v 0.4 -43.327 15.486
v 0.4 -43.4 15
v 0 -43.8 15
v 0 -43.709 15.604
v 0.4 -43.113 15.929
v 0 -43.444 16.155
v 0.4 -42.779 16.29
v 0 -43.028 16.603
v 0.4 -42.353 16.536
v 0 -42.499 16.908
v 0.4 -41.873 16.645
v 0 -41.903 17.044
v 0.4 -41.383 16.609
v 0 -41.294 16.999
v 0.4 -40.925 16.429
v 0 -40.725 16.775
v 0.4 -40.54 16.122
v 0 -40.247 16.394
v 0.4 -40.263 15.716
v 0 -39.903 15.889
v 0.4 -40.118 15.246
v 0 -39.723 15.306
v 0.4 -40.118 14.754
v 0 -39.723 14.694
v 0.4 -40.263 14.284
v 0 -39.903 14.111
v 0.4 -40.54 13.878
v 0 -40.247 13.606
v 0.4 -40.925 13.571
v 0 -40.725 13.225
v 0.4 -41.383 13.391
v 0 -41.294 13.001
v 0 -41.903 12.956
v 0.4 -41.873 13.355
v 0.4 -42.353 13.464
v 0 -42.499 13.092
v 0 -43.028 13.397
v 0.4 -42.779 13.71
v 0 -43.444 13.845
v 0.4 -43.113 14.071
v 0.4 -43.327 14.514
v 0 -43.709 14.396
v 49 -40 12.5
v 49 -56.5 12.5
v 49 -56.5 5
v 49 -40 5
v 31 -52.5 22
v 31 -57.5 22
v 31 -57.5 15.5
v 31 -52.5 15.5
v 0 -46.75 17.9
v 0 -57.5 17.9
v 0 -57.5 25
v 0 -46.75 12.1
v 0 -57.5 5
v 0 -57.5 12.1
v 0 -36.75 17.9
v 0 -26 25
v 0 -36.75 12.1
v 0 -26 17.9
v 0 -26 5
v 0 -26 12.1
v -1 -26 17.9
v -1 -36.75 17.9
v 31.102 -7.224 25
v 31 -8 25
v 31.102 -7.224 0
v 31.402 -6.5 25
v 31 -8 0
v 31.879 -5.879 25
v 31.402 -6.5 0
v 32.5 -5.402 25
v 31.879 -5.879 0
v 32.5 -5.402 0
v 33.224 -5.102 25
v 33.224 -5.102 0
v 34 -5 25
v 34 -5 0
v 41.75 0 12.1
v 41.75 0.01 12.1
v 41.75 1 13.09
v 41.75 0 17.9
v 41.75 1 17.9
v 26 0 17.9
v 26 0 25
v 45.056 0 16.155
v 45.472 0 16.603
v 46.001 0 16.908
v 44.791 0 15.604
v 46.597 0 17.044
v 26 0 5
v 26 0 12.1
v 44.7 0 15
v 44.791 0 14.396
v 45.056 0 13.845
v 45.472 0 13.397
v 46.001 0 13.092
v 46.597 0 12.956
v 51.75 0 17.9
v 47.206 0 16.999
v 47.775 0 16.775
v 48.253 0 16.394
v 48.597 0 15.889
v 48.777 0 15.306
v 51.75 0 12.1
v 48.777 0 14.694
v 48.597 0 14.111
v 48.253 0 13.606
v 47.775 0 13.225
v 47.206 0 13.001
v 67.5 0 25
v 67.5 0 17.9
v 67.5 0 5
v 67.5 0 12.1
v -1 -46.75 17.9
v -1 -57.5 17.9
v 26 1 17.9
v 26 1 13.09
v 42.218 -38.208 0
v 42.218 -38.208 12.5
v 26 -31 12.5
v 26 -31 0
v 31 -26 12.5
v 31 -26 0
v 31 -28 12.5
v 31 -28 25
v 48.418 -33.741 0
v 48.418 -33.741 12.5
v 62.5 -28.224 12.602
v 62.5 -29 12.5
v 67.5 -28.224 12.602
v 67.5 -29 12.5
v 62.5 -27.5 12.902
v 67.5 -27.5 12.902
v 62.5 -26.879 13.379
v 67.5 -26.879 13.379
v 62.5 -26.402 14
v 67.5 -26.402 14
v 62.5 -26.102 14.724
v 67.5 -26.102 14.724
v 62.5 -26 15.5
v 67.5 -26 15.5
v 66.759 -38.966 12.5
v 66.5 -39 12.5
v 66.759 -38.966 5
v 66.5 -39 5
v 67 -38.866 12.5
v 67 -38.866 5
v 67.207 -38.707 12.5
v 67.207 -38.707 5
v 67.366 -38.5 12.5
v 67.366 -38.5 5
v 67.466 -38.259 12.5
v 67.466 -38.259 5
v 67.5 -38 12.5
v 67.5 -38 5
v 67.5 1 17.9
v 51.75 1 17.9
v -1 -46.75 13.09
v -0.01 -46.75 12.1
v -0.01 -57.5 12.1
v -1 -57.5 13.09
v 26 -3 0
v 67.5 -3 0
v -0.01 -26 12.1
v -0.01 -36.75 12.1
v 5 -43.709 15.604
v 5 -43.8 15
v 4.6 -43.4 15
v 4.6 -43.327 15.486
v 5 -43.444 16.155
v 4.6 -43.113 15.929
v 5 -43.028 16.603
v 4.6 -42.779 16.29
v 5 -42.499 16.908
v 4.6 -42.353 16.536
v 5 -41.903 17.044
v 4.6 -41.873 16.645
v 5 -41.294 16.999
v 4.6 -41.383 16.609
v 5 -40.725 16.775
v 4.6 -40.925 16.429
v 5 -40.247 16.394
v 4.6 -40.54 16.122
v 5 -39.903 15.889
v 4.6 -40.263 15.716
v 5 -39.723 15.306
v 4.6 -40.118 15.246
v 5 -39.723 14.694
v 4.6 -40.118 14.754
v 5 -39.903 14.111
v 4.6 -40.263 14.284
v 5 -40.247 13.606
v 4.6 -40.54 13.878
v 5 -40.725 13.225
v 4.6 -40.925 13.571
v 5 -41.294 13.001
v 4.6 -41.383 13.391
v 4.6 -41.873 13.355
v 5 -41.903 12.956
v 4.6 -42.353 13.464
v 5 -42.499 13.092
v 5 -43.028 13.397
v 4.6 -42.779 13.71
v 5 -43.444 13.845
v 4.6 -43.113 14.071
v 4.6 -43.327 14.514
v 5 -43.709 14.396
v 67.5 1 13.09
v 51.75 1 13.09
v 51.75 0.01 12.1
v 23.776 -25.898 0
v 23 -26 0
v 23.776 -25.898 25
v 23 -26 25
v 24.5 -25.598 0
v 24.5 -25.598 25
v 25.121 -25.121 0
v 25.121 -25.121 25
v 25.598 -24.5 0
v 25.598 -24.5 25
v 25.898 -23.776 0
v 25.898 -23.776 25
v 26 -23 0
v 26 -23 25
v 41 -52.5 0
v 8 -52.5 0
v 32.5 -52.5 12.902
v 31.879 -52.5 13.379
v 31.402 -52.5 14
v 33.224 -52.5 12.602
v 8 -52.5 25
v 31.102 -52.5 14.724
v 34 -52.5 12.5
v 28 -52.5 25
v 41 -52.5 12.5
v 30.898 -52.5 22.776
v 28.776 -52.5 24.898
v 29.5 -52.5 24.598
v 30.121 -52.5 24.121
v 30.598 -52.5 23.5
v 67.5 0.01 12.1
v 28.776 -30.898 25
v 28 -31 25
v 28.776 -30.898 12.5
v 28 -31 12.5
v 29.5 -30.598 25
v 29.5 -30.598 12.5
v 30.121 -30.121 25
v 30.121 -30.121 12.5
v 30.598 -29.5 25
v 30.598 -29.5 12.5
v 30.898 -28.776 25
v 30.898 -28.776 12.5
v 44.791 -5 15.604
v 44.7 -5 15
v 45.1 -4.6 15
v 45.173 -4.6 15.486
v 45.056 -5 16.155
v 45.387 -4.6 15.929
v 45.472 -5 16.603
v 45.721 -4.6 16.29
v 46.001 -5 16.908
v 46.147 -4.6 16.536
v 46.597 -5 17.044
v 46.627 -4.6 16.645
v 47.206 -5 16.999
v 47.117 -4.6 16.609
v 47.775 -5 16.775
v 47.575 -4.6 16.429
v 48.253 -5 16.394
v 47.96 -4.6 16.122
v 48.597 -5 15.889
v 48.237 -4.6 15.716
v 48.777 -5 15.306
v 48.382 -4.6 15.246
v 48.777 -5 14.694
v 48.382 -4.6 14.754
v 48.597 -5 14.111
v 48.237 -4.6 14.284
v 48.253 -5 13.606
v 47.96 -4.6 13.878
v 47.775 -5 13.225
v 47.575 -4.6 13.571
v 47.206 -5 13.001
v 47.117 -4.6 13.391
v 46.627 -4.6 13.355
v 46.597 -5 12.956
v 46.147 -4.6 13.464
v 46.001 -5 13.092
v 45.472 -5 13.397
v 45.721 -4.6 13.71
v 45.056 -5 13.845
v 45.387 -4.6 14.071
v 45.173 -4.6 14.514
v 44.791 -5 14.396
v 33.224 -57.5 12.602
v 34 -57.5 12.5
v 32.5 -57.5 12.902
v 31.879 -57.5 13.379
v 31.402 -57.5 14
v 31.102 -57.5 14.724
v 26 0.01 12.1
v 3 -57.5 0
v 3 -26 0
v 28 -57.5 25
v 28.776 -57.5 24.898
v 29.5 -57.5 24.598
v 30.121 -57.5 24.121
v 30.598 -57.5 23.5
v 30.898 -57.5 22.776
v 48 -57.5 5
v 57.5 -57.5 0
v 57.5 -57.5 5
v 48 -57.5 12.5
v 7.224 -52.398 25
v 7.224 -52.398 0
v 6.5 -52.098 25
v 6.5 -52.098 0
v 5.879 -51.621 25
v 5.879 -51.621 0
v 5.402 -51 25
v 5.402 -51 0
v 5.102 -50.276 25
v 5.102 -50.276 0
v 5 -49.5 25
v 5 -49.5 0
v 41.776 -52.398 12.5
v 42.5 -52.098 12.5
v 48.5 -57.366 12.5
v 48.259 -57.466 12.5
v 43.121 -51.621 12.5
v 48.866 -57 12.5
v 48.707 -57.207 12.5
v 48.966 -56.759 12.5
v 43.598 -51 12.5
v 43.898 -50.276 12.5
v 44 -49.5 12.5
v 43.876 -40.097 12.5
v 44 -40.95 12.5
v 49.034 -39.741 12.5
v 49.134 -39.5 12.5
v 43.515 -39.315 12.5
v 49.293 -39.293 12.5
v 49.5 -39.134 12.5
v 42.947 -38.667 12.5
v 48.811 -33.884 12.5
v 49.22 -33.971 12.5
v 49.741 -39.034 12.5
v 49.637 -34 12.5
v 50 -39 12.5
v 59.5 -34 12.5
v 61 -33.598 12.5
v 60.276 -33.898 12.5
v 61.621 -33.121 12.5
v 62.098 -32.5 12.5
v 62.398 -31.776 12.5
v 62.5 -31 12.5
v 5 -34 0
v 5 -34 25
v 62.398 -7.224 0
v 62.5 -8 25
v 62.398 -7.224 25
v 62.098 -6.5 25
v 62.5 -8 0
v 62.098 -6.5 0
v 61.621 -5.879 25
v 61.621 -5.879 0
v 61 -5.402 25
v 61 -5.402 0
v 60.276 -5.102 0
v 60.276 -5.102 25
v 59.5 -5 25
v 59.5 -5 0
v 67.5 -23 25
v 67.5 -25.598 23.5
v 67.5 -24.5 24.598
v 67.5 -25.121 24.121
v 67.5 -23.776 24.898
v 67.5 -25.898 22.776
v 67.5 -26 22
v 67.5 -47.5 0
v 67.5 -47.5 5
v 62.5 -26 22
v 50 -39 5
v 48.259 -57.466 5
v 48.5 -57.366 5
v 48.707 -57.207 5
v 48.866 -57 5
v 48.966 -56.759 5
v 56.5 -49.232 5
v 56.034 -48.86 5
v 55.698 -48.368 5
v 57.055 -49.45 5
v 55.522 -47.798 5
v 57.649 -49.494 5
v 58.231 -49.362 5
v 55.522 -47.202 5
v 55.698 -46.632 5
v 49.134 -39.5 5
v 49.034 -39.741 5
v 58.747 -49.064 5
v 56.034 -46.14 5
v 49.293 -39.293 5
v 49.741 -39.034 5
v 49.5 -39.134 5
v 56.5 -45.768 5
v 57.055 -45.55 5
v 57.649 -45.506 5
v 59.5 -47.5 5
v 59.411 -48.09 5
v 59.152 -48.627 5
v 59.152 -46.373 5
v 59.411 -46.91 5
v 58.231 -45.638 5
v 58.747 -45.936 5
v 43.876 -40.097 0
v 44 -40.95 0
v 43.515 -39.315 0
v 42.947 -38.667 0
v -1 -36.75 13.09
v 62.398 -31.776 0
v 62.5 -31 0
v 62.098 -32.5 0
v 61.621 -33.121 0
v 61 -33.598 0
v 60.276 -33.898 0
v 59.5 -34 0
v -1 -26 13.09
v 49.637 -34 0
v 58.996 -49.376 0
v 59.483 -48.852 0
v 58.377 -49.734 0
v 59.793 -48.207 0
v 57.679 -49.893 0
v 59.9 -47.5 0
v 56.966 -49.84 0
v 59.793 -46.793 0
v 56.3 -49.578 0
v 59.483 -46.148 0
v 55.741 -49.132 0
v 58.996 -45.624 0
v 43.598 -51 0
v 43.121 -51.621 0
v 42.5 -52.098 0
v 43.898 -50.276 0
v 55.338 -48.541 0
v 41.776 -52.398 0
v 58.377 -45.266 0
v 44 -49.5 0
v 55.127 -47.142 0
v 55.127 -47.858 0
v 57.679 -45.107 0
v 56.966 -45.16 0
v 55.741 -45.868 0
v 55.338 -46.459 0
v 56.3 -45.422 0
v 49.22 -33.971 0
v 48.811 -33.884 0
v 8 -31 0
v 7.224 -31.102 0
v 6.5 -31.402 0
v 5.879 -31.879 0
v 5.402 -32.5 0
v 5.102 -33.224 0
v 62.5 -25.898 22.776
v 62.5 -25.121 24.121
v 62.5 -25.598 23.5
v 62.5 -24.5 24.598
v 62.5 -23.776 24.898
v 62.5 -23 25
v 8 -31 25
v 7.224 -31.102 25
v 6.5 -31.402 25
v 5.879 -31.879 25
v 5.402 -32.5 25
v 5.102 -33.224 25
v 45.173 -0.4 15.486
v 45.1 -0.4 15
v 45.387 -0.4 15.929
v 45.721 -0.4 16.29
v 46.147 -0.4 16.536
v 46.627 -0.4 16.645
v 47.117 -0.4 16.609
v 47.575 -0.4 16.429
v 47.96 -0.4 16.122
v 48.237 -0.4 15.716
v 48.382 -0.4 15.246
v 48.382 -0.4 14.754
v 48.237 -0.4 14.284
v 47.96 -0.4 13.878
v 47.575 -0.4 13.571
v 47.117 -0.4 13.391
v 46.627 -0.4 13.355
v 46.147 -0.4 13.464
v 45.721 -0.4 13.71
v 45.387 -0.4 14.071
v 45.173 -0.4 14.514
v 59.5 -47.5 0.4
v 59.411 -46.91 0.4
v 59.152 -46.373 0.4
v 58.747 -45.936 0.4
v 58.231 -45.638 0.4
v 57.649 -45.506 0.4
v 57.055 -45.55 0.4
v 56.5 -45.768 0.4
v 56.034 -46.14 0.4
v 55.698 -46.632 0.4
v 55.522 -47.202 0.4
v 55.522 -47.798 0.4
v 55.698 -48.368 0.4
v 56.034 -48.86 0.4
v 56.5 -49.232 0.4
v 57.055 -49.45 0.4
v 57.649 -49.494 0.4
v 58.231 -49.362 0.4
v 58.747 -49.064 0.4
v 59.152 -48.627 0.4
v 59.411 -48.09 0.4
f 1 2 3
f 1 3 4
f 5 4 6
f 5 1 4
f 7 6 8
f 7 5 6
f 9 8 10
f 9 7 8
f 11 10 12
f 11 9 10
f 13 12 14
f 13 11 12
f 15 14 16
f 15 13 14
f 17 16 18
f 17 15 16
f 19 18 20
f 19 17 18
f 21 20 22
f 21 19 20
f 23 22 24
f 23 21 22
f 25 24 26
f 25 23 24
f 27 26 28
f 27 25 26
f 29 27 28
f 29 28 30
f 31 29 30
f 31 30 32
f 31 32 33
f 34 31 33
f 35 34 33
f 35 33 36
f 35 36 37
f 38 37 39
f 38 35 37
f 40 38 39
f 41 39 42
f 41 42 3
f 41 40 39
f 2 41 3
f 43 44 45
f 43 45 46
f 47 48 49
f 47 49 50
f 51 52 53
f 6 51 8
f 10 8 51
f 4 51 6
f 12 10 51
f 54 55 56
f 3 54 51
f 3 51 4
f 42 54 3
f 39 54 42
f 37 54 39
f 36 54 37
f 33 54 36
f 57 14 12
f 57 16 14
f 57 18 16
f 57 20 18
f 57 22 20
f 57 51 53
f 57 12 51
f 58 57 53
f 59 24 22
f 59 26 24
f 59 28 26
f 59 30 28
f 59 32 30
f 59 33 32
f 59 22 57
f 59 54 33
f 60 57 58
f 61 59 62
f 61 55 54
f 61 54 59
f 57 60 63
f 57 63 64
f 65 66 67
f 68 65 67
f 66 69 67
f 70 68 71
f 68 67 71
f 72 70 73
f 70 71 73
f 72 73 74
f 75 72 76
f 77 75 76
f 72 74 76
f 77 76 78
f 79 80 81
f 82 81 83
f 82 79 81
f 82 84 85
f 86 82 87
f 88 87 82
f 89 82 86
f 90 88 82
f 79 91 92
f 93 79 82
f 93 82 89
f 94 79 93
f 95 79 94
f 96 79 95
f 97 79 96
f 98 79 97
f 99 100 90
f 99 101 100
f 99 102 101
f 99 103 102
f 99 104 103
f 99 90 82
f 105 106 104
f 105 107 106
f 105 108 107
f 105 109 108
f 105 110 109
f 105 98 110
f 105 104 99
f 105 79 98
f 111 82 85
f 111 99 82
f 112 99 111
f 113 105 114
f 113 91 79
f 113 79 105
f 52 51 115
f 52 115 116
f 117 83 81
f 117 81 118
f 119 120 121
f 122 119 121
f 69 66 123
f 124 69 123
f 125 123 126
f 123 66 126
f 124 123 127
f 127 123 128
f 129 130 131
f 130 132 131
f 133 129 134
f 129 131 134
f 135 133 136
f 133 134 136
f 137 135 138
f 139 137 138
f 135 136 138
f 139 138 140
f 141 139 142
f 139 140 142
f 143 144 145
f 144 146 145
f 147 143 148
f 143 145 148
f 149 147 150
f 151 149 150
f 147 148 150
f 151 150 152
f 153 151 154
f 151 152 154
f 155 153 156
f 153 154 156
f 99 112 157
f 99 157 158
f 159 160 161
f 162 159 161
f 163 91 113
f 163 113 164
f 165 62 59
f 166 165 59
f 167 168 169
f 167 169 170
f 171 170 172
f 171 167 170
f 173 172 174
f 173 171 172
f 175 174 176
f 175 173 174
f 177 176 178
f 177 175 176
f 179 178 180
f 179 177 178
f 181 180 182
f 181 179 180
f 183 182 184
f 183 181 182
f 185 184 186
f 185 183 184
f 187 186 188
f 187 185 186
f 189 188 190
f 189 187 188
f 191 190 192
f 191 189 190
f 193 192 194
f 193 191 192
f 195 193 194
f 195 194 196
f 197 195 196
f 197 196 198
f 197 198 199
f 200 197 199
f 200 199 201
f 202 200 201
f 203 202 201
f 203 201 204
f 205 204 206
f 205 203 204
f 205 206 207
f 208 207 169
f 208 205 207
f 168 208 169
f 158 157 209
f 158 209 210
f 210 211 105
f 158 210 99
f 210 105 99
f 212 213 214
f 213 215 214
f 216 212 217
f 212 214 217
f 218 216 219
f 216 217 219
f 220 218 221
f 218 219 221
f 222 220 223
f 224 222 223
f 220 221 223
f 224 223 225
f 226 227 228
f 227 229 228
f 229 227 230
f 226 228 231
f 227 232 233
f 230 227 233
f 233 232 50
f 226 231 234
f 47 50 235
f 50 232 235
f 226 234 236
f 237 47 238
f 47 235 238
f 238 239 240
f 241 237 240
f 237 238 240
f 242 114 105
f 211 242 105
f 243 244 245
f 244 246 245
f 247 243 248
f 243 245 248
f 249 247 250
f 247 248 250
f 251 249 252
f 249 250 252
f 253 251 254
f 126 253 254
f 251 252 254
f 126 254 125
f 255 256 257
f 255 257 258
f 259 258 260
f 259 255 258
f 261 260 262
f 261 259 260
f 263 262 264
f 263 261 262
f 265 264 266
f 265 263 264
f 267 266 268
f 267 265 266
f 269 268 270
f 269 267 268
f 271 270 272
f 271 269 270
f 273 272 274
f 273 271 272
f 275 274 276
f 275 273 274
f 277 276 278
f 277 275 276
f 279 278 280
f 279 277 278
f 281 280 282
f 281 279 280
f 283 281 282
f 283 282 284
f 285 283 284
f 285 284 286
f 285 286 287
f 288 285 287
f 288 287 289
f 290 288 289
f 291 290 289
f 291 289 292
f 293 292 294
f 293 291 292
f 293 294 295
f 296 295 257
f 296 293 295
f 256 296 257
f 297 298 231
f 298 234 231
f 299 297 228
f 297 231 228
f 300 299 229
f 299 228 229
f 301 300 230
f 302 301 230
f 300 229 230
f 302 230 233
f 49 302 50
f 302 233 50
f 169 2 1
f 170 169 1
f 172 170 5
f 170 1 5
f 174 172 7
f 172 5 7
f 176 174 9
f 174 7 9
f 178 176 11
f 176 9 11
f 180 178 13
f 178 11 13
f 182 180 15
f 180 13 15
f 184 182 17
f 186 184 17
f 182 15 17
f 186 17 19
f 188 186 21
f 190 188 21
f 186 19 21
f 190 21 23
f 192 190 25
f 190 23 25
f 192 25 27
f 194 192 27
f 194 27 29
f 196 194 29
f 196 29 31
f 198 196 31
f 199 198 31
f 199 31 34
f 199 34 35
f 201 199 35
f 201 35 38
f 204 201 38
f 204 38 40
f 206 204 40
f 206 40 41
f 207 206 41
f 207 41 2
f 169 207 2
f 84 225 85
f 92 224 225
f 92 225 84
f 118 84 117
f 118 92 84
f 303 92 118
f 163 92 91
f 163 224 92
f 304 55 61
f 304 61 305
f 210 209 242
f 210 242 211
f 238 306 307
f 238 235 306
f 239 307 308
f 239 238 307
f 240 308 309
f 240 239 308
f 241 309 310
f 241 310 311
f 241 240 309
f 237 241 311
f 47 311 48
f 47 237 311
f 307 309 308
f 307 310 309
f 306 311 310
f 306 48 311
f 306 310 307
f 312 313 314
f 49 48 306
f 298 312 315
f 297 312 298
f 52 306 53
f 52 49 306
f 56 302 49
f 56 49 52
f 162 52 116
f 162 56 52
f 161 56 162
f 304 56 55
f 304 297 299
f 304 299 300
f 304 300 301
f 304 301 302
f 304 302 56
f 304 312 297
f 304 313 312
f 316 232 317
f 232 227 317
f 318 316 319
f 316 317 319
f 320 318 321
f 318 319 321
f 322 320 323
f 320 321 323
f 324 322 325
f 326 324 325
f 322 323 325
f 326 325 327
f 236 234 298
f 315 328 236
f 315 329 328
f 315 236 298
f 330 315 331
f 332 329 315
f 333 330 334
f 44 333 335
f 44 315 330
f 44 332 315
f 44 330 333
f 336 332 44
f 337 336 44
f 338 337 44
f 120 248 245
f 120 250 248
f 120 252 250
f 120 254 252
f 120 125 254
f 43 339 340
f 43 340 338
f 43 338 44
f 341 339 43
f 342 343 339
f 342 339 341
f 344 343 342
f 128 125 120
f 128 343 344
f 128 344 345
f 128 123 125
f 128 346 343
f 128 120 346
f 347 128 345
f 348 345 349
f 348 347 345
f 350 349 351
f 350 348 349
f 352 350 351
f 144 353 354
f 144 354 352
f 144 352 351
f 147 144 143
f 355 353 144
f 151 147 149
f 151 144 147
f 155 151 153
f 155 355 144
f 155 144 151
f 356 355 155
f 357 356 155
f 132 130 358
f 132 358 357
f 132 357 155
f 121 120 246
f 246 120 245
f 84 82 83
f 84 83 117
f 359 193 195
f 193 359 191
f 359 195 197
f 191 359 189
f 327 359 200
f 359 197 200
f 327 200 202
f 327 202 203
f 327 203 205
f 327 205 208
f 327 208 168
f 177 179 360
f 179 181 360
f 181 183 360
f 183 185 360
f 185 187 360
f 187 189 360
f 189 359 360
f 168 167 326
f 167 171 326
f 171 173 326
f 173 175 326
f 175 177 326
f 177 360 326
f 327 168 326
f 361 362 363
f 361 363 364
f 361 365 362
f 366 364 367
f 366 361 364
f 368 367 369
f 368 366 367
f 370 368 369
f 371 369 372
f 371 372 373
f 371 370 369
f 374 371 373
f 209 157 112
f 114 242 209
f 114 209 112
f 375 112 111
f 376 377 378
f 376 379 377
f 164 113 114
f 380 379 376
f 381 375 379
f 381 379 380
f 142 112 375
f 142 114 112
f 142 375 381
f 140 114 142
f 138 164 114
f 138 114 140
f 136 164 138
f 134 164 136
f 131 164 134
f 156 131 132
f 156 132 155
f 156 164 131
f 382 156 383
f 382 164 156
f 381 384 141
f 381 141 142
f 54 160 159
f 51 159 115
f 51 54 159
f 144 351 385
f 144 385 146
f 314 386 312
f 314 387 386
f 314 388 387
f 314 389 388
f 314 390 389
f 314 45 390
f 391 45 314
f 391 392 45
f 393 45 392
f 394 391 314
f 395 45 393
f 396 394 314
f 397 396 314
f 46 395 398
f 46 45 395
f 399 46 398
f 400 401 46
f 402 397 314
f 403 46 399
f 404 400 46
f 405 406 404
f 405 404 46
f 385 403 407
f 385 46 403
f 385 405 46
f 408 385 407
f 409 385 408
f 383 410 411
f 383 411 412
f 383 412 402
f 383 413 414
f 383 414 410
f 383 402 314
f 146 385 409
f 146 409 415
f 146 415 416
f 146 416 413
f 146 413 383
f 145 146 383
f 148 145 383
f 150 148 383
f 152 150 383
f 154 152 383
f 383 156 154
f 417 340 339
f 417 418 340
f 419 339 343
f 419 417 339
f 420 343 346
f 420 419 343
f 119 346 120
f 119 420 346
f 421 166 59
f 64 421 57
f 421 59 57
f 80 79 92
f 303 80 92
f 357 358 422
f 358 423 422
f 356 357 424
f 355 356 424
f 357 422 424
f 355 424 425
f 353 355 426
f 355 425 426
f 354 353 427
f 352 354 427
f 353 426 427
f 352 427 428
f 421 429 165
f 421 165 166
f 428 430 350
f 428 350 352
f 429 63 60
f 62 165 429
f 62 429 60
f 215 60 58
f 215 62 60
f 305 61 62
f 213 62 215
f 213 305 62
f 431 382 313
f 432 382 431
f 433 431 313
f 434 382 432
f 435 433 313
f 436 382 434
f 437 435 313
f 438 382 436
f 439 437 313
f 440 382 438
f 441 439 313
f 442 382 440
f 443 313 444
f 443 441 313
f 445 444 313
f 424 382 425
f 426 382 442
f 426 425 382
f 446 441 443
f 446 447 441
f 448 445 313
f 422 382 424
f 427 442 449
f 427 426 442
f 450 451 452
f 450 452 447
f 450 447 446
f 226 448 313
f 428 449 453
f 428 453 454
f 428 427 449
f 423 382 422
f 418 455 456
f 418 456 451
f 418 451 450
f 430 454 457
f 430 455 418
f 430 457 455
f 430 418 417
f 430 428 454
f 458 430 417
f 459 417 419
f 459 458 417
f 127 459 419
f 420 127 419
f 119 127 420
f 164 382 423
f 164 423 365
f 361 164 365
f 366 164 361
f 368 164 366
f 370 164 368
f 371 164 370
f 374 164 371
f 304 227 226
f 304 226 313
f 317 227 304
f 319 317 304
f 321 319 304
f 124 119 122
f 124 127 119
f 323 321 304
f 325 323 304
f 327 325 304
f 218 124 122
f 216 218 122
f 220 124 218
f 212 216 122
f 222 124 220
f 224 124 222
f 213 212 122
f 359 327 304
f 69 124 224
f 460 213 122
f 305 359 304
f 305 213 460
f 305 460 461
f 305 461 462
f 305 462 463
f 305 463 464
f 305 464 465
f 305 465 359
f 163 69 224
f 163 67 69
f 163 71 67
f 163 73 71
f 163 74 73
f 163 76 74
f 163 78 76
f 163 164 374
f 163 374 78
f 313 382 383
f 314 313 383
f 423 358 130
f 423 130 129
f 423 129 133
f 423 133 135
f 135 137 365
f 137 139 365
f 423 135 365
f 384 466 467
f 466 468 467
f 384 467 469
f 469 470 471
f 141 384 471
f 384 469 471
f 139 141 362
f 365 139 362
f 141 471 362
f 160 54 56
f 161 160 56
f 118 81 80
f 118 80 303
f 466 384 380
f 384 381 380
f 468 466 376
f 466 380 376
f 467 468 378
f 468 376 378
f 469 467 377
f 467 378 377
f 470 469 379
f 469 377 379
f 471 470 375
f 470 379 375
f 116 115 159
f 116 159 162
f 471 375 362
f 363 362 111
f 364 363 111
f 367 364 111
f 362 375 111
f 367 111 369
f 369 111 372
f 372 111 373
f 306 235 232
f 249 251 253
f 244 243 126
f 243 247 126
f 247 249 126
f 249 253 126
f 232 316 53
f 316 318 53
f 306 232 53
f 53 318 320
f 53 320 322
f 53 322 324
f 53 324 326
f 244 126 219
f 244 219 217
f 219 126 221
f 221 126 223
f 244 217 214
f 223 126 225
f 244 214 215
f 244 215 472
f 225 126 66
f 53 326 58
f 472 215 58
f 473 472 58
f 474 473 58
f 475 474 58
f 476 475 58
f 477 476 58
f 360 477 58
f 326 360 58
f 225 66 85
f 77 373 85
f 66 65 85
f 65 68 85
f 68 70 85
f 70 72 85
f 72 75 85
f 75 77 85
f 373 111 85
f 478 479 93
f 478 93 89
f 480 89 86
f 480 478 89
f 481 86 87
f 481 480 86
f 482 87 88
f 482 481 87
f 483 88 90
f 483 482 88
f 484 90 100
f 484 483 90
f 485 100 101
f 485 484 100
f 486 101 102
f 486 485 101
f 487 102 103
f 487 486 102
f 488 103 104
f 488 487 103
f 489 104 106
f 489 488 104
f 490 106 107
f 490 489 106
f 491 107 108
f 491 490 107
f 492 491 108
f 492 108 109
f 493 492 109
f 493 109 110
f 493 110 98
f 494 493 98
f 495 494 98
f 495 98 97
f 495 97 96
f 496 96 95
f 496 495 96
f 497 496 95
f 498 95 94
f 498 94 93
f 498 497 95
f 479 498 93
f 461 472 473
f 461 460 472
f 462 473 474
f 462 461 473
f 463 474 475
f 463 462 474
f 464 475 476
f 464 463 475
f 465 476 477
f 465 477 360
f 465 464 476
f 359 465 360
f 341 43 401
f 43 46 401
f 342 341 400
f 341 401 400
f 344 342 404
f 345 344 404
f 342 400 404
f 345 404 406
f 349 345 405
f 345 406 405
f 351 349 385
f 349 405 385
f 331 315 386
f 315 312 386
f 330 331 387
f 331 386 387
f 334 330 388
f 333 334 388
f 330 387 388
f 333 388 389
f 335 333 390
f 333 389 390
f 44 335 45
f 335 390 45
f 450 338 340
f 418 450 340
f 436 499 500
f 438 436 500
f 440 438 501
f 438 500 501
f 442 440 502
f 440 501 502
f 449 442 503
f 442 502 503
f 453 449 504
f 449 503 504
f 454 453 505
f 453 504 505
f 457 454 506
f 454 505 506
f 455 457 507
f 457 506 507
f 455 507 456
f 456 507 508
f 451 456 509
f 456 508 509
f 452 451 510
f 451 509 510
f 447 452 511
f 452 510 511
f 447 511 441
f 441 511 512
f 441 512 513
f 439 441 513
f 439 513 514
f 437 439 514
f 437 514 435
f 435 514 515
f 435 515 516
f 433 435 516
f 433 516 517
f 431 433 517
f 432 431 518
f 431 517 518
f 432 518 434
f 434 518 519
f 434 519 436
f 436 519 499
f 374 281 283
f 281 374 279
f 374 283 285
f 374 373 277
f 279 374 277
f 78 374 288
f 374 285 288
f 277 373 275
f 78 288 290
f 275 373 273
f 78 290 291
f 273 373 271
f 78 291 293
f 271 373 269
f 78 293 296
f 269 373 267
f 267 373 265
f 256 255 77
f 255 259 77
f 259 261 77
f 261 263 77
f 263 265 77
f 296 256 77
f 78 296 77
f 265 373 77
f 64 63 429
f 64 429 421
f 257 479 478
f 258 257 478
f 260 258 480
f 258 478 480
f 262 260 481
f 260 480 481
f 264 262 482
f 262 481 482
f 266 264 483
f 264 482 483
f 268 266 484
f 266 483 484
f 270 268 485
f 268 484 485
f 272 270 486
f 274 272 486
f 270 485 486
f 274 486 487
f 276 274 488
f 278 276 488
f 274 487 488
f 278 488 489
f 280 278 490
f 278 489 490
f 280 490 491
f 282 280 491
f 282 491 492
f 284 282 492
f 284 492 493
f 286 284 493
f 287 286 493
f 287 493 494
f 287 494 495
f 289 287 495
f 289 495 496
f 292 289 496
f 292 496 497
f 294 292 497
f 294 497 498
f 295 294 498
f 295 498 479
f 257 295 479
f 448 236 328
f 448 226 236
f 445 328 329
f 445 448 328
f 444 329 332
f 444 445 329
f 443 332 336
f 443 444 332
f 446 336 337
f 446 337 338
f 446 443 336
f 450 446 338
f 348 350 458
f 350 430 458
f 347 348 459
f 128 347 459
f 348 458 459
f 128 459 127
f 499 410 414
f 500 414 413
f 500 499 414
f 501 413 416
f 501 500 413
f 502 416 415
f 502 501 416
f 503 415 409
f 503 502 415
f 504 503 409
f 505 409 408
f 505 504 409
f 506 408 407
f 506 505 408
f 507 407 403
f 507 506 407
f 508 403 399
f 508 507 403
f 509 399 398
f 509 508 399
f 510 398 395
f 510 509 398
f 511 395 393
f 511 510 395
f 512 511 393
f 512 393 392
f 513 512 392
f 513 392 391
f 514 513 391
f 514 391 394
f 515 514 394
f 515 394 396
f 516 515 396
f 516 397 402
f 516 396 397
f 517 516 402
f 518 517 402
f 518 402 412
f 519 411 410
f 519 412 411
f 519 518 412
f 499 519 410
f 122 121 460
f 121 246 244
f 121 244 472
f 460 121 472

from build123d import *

# Parameters (mm, degrees)
SKETCH_R        = 2
PAD_DEPTH       = 25
SKETCH001_W     = 18.5
SKETCH001_H     = 18.5
POCKET_DEPTH    = 20
CHAMFER_SIZE    = 10
POCKET001_DEPTH = 57.501
POCKET002_DEPTH = 67.501
POCKET003_DEPTH = 25.001
SKETCH005_R     = 1.65
POCKET004_DEPTH = 67.501
SKETCH006_R     = 1.65
POCKET005_DEPTH = 57.501
SKETCH007_W     = 36.5
SKETCH007_H     = 31.5
POCKET006_DEPTH = 12.5
SKETCH008_W     = 5
SKETCH008_H     = 2.222222
POCKET007_DEPTH = 12.5
FILLET_R        = 3
FILLET001_R     = 3
FILLET002_R     = 1
CHAMFER001_SIZE = 0.4
SKETCH009_W     = 10.75
SKETCH009_H     = 5.8
PAD001_DEPTH    = 1
SKETCH010_W     = 15.75
SKETCH010_H     = 5.8
PAD002_DEPTH    = 1
CHAMFER002_SIZE = 0.99


with BuildPart() as part:
    # Sketch → Pad (new body)
    with BuildSketch(Plane.XY):
        Polygon((0, -26), (26, -26), (26, 0), (67.5, 0), (67.5, -57.5), (0, -57.5), align=None)
        with Locations((57.5, -47.5)):
            Circle(SKETCH_R, mode=Mode.SUBTRACT)
    extrude(amount=PAD_DEPTH)

    # Sketch001 (on Face9 of Pad) → Pocket (cut)
    with BuildSketch(Plane.XY.offset(25)):
        with Locations((58.25, -48.25)):
            Rectangle(SKETCH001_W, SKETCH001_H)
    extrude(amount=-POCKET_DEPTH, mode=Mode.SUBTRACT)

    # Chamfer
    chamfer_edges = [part.edges().sort_by_distance(p)[0] for p in [
        (67.5, -57.5, 2.5),
    ]]
    chamfer(chamfer_edges, length=CHAMFER_SIZE)

    # Sketch002 (on Face5 of Chamfer) → Pocket001 (cut, through all)
    with BuildSketch(Plane.XZ.offset(57.5)):
        Polygon((0, 5), (3, 0), (0, 0), align=None)
    extrude(amount=-POCKET001_DEPTH, mode=Mode.SUBTRACT)

    # Sketch003 (on Face2 of Pocket001) → Pocket002 (cut, through all)
    with BuildSketch(Plane.YZ.offset(67.5)):
        Polygon((0, 5), (-3, 0), (0, 0), align=None)
    extrude(amount=-POCKET002_DEPTH, mode=Mode.SUBTRACT)

    # Sketch004 (on Face11 of Pocket002) → Pocket003 (cut, through all)
    with BuildSketch(Plane.XY.offset(25)):
        Polygon((5, -31), (5, -52.5), (44, -52.5), (44, -39), (26, -31), align=None)
        Polygon((31, -26), (49, -34), (62.5, -34), (62.5, -5), (31, -5), align=None)
    extrude(amount=-POCKET003_DEPTH, mode=Mode.SUBTRACT)

    # Sketch005 (on Face24 of Pocket003) → Pocket004 (cut, through all)
    with BuildSketch(Plane(origin=(0, 0, 0), x_dir=(0, -1, 0), z_dir=(-1, 0, 0))):
        with Locations((41.75, 15)):
            Circle(SKETCH005_R)
    extrude(amount=-POCKET004_DEPTH, mode=Mode.SUBTRACT)

    # Sketch006 (on Face20 of Pocket004) → Pocket005 (cut, through all)
    with BuildSketch(Plane(origin=(0, 0, 0), x_dir=(-1, 0, 0), z_dir=(0, 1, 0))):
        with Locations((-46.75, 15)):
            Circle(SKETCH006_R)
    extrude(amount=-POCKET005_DEPTH, mode=Mode.SUBTRACT)

    # Sketch007 (on Face23 of Pocket005) → Pocket006 (cut)
    with BuildSketch(Plane.XY.offset(25)):
        with Locations((49.25, -41.75)):
            Rectangle(SKETCH007_W, SKETCH007_H)
    extrude(amount=-POCKET006_DEPTH, mode=Mode.SUBTRACT)

    # Sketch008 (on Face25 of Pocket006) → Pocket007 (cut)
    with BuildSketch(Plane.XY.offset(25)):
        with Locations((28.5, -32.111111)):
            Rectangle(SKETCH008_W, SKETCH008_H)
    extrude(amount=-POCKET007_DEPTH, mode=Mode.SUBTRACT)

    # Fillet
    fillet_edges = [part.edges().sort_by_distance(p)[0] for p in [
        (31, -55, 25),
        (65, -26, 25),
        (31, -55, 12.5),
        (65, -26, 12.5),
    ]]
    fillet(fillet_edges, radius=FILLET_R)

    # Fillet001
    fillet001_edges = [part.edges().sort_by_distance(p)[0] for p in [
        (5, -52.5, 12.5),
        (5, -31, 12.5),
        (31, -5, 12.5),
        (62.5, -5, 12.5),
        (62.5, -34, 6.25),
        (49, -34, 6.25),
        (44, -39, 6.25),
        (44, -52.5, 6.25),
        (31, -31, 18.75),
        (26, -26, 12.5),
    ]]
    fillet(fillet001_edges, radius=FILLET001_R)

    # Fillet002
    fillet002_edges = [part.edges().sort_by_distance(p)[0] for p in [
        (49, -57.5, 8.75),
        (49, -39, 8.75),
        (67.5, -39, 8.75),
    ]]
    fillet(fillet002_edges, radius=FILLET002_R)

    # Chamfer001
    chamfer001_edges = [part.edges().sort_by_distance(p)[0] for p in [
        (55.5, -47.5, 0),
        (48.4, 0, 15),
        (48.4, -5, 15),
        (5, -40.1, 15),
        (0, -40.1, 15),
    ]]
    chamfer(chamfer001_edges, length=CHAMFER001_SIZE)

    # Sketch009 (on Face32 of Chamfer001) → Pad001 (join)
    with BuildSketch(Plane(origin=(0, 0, 0), x_dir=(0, -1, 0), z_dir=(-1, 0, 0))):
        with Locations((31.375, 15)):
            Rectangle(SKETCH009_W, SKETCH009_H)
        with Locations((52.125, 15)):
            Rectangle(SKETCH009_W, SKETCH009_H)
    extrude(amount=PAD001_DEPTH)

    # Sketch010 (on Face31 of Pad001) → Pad002 (join)
    with BuildSketch(Plane(origin=(0, 0, 0), x_dir=(-1, 0, 0), z_dir=(0, 1, 0))):
        with Locations((-59.625, 15)):
            Rectangle(SKETCH010_W, SKETCH010_H)
        with Locations((-33.875, 15)):
            Rectangle(SKETCH010_W, SKETCH010_H)
    extrude(amount=PAD002_DEPTH)

    # Chamfer002
    chamfer002_edges = [part.edges().sort_by_distance(p)[0] for p in [
        (59.625, 1, 12.1),
        (33.875, 1, 12.1),
        (-1, -31.375, 12.1),
        (-1, -52.125, 12.1),
    ]]
    chamfer(chamfer002_edges, length=CHAMFER002_SIZE)


solid = part.part
